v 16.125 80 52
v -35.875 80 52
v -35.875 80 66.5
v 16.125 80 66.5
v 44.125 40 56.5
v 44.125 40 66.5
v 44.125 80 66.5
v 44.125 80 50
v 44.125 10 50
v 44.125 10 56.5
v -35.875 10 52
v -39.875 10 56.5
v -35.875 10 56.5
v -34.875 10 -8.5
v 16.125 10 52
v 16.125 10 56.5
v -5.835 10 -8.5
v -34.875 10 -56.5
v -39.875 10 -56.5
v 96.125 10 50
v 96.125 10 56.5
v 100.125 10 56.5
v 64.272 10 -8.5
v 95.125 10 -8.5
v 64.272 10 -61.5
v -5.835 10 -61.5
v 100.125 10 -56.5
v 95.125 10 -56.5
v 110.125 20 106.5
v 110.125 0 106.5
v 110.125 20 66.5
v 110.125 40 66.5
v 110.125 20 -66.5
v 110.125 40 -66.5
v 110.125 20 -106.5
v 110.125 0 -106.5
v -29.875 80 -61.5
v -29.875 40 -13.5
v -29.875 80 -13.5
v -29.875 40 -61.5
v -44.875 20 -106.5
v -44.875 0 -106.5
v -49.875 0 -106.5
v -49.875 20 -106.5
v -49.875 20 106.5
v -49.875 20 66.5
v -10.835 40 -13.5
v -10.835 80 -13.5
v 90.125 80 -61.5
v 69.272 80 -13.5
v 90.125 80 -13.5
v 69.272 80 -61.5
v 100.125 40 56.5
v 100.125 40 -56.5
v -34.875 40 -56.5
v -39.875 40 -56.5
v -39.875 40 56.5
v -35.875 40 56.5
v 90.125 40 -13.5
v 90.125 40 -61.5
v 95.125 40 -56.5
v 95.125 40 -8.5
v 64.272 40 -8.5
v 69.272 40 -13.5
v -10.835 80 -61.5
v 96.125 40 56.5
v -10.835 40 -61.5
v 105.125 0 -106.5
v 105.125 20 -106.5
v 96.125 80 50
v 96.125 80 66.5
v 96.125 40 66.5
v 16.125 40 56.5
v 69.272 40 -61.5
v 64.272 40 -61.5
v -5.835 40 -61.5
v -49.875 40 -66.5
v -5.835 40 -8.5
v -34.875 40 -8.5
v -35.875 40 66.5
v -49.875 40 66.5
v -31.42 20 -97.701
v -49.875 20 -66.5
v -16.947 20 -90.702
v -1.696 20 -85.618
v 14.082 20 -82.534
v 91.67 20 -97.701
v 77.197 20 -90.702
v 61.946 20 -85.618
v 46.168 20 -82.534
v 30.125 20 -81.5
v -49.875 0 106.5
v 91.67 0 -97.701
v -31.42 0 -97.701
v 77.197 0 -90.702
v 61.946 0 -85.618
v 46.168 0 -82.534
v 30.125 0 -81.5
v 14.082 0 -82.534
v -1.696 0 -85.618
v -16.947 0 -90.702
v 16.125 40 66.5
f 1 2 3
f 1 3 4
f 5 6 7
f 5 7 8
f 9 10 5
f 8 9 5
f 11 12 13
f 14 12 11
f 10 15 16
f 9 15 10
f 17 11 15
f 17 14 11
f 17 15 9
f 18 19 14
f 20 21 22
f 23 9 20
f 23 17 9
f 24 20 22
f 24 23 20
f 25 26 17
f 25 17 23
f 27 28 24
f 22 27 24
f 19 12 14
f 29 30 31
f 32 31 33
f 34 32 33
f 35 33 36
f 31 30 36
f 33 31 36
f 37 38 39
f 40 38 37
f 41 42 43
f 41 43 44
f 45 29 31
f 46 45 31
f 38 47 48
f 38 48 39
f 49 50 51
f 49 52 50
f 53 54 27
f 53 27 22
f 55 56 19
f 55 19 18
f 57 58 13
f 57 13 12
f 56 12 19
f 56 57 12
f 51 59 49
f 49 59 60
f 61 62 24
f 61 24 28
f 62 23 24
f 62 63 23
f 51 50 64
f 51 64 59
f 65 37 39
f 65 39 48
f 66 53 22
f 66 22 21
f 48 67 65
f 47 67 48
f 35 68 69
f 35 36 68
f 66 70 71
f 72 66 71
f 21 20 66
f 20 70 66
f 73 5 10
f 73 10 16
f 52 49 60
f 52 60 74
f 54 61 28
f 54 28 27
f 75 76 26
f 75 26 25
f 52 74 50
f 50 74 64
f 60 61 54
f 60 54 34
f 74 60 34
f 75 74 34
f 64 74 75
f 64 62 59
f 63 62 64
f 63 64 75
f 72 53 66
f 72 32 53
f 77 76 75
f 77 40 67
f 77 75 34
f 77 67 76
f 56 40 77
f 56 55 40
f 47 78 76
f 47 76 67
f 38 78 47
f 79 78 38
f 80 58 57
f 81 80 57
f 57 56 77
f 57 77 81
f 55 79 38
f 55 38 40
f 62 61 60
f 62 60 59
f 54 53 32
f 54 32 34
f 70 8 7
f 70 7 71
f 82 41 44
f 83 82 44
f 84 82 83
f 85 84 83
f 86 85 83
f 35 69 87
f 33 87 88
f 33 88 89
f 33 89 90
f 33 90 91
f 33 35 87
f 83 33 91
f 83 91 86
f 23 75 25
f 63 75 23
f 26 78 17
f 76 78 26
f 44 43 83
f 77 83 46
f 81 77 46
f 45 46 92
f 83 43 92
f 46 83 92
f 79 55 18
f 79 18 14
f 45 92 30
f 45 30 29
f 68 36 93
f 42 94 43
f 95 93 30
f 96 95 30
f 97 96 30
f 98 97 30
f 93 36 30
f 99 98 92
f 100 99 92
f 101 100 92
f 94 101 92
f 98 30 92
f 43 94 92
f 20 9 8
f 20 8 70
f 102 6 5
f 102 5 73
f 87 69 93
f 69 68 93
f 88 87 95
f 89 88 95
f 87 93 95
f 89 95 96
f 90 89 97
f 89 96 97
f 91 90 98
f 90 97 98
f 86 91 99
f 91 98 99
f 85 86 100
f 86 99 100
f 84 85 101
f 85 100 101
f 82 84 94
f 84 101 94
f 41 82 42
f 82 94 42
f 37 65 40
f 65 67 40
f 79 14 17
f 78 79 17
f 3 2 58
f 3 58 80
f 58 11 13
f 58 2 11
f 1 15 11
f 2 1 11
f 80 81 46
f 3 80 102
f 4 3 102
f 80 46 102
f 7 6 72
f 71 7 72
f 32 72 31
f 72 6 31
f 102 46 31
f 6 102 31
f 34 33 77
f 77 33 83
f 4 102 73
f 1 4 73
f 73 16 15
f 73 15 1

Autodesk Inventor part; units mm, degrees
ref_plane "YZ Plane" through (0, 0, 0) normal (1, 0, 0) x (0, 1, 0)
ref_plane "XZ Plane" through (0, 0, 0) normal (0, 1, 0) x (-1, 0, 0)
ref_plane "XY Plane" through (0, 0, 0) normal (0, 0, 1) x (1, 0, 0)
sketch "Sketch1" plane through (0, 0, 0) normal (0, 1, 0) x (-1, 0, 0)
  line L0 (49.875, 66.5) -> (-110.125, 66.5)
  line L1 (-110.125, 66.5) -> (-110.125, -66.5)
  line L2 (-110.125, -66.5) -> (49.875, -66.5)
  line L3 (49.875, -66.5) -> (49.875, 66.5)
  line L4 (24.875, -66.5) -> (-85.125, -66.5)
  line L5 (-85.125, -66.5) -> (-85.125, -219)
  line L6 (-85.125, -219) -> (24.875, -219)
  line L7 (24.875, -219) -> (24.875, -66.5)
  point P0 (0, 0)
  dimension "d0" = 133
  dimension "d1" = 160
  dimension "d2" = 25
  dimension "d3" = 25
  dimension "d4" = 110
extrude "Extrusion1" add sketch "Sketch1" along normal blind 40 contours L3 L2 L1 L0
sketch "Sketch2" plane through (0, 40, 0) normal (0, 1, 0) x (1, 0, 0)
  line L0 (110.125, 66.5) -> (-49.875, 66.5) construction
  line L1 (-49.875, 66.5) -> (-49.875, -66.5) construction
  line L2 (-49.875, -66.5) -> (110.125, -66.5) construction
  line L3 (110.125, -66.5) -> (110.125, 66.5) construction
  line L4 (-29.875, 66.5) -> (-10.8349, 66.5)
  line L5 (-10.8349, 66.5) -> (-10.8349, 13.5)
  line L6 (-10.8349, 13.5) -> (-29.875, 13.5)
  line L7 (-29.875, 13.5) -> (-29.875, 66.5)
  line L8 (90.125, 66.5) -> (69.2723, 66.5)
  line L9 (69.2723, 66.5) -> (69.2723, 13.5)
  line L10 (69.2723, 13.5) -> (90.125, 13.5)
  line L11 (90.125, 13.5) -> (90.125, 66.5)
  line L12 (-32.3584, 66.5) -> (100, 66.5)
  line L13 (100, 66.5) -> (100, 61.5)
  line L14 (100, 61.5) -> (-32.3584, 61.5)
  line L15 (-32.3584, 61.5) -> (-32.3584, 66.5)
  point P0 (0, 0)
  point P1 (-10.8349, 61.5)
  point P2 (-29.875, 61.5)
  point P3 (90.125, 61.5)
  point P4 (69.2723, 61.5)
  point P5 (-27, 66.5)
  dimension "d7" = 20
  dimension "d8" = 20
  dimension "d11" = 80
  dimension "d12" = 80
  dimension "d13" = 120
  dimension "d35" = 5
extrude "Extrusion2" add sketch "Sketch2" along normal blind 40 contours L14 L5 L6 L7 | L14 L11 L10 L9
sketch "Sketch3" plane through (0, 40, 0) normal (0, 1, 0) x (1, 0, 0)
  line L0 (90.125, 61.5) -> (90.125, 13.5) construction
  line L1 (90.125, 13.5) -> (69.2723, 13.5) construction
  line L2 (69.2723, 13.5) -> (69.2723, 61.5) construction
  line L3 (-10.8349, 61.5) -> (-10.8349, 13.5) construction
  line L4 (-10.8349, 13.5) -> (-29.875, 13.5) construction
  line L5 (-29.875, 13.5) -> (-29.875, 61.5) construction
  line L6 (-49.875, 66.5) -> (-49.875, -66.5) construction
  line L7 (-49.875, -66.5) -> (110.125, -66.5) construction
  line L8 (110.125, -66.5) -> (110.125, 66.5) construction
  line L9 (-39.875, -56.5) -> (-39.875, 56.5)
  line L10 (-39.875, 56.5) -> (-34.875, 56.5)
  line L11 (-34.875, 56.5) -> (-34.875, 8.5)
  line L12 (-34.875, 8.5) -> (-5.8349, 8.5)
  line L13 (-5.8349, 8.5) -> (-5.8349, 61.5)
  line L14 (-5.8349, 61.5) -> (64.2723, 61.5)
  line L15 (64.2723, 61.5) -> (64.2723, 8.5)
  line L16 (64.2723, 8.5) -> (95.125, 8.5)
  line L17 (95.125, 8.5) -> (95.125, 56.5)
  line L18 (95.125, 56.5) -> (100.125, 56.5)
  line L19 (100.125, 56.5) -> (100.125, -56.5)
  line L20 (100.125, -56.5) -> (-39.875, -56.5)
  line L21 (-29.875, 61.5) -> (-10.8349, 61.5) projected
  line L22 (69.2723, 61.5) -> (90.125, 61.5) projected
  line L23 (110.125, 66.5) -> (-49.875, 66.5) projected
  point P0 (0, 0)
  dimension "d16" = 10
extrude "Extrusion3" cut sketch "Sketch3" against normal blind 30
sketch "Sketch4" plane through (0, 40, 0) normal (0, 1, 0) x (1, 0, 0)
  line L0 (-49.875, 66.5) -> (-49.875, -66.5) construction
  line L1 (-49.875, -66.5) -> (110.125, -66.5) construction
  line L2 (110.125, -66.5) -> (110.125, 66.5) construction
  line L3 (-35.875, -66.5) -> (16.125, -66.5)
  line L4 (16.125, -66.5) -> (16.125, -52)
  line L5 (16.125, -52) -> (-35.875, -52)
  line L6 (-35.875, -52) -> (-35.875, -66.5)
  line L7 (96.125, -66.5) -> (44.125, -66.5)
  line L8 (44.125, -66.5) -> (44.125, -50)
  line L9 (44.125, -50) -> (96.125, -50)
  line L10 (96.125, -50) -> (96.125, -66.5)
  point P0 (0, 0)
  dimension "d19" = 28
  dimension "d20" = 14
  dimension "d21" = 14
  dimension "d24" = 52
  dimension "d25" = 52
extrude "Extrusion4" add sketch "Sketch4" along normal mid plane 80
sketch "Sketch5" plane through (110.125, 0, 66.5) normal (1, 0, 0) x (0, 0, -1)
  line L0 (133, 0) -> (133, 40) construction
  line L1 (133, 0) -> (173, 0)
  line L2 (173, 0) -> (173, 20)
  line L3 (173, 20) -> (133, 20)
  line L4 (133, 20) -> (133, 0)
  line L5 (0, 0) -> (-40, 0)
  line L6 (-40, 0) -> (-40, 20)
  line L7 (-40, 20) -> (0, 20)
  line L8 (0, 20) -> (0, 0)
  point P0 (66.5, 0)
  dimension "d26" = 20
  dimension "d27" = 40
  dimension "d30" = 40
extrude "Extrusion5" add sketch "Sketch5" against normal up to surface (160 mm away)
sketch "Sketch6" plane through (0, 0, 0) normal (0, -1, 0) x (1, 0, 0)
  line L0 (110.125, -106.5) -> (-49.875, -106.5) construction
  circle A0 centre (30.125, -206.5) radius 125
  point P0 (0, 0)
  dimension "d31" = 100
  dimension "d32" = 250
extrude "Extrusion6" cut sketch "Sketch6" against normal blind 100
sketch "Sketch7" plane through (0, 80, 0) normal (0, 1, 0) x (1, 0, 0)
  point P0 (0, 0)
properties part number "FlanecForwardBabka"
